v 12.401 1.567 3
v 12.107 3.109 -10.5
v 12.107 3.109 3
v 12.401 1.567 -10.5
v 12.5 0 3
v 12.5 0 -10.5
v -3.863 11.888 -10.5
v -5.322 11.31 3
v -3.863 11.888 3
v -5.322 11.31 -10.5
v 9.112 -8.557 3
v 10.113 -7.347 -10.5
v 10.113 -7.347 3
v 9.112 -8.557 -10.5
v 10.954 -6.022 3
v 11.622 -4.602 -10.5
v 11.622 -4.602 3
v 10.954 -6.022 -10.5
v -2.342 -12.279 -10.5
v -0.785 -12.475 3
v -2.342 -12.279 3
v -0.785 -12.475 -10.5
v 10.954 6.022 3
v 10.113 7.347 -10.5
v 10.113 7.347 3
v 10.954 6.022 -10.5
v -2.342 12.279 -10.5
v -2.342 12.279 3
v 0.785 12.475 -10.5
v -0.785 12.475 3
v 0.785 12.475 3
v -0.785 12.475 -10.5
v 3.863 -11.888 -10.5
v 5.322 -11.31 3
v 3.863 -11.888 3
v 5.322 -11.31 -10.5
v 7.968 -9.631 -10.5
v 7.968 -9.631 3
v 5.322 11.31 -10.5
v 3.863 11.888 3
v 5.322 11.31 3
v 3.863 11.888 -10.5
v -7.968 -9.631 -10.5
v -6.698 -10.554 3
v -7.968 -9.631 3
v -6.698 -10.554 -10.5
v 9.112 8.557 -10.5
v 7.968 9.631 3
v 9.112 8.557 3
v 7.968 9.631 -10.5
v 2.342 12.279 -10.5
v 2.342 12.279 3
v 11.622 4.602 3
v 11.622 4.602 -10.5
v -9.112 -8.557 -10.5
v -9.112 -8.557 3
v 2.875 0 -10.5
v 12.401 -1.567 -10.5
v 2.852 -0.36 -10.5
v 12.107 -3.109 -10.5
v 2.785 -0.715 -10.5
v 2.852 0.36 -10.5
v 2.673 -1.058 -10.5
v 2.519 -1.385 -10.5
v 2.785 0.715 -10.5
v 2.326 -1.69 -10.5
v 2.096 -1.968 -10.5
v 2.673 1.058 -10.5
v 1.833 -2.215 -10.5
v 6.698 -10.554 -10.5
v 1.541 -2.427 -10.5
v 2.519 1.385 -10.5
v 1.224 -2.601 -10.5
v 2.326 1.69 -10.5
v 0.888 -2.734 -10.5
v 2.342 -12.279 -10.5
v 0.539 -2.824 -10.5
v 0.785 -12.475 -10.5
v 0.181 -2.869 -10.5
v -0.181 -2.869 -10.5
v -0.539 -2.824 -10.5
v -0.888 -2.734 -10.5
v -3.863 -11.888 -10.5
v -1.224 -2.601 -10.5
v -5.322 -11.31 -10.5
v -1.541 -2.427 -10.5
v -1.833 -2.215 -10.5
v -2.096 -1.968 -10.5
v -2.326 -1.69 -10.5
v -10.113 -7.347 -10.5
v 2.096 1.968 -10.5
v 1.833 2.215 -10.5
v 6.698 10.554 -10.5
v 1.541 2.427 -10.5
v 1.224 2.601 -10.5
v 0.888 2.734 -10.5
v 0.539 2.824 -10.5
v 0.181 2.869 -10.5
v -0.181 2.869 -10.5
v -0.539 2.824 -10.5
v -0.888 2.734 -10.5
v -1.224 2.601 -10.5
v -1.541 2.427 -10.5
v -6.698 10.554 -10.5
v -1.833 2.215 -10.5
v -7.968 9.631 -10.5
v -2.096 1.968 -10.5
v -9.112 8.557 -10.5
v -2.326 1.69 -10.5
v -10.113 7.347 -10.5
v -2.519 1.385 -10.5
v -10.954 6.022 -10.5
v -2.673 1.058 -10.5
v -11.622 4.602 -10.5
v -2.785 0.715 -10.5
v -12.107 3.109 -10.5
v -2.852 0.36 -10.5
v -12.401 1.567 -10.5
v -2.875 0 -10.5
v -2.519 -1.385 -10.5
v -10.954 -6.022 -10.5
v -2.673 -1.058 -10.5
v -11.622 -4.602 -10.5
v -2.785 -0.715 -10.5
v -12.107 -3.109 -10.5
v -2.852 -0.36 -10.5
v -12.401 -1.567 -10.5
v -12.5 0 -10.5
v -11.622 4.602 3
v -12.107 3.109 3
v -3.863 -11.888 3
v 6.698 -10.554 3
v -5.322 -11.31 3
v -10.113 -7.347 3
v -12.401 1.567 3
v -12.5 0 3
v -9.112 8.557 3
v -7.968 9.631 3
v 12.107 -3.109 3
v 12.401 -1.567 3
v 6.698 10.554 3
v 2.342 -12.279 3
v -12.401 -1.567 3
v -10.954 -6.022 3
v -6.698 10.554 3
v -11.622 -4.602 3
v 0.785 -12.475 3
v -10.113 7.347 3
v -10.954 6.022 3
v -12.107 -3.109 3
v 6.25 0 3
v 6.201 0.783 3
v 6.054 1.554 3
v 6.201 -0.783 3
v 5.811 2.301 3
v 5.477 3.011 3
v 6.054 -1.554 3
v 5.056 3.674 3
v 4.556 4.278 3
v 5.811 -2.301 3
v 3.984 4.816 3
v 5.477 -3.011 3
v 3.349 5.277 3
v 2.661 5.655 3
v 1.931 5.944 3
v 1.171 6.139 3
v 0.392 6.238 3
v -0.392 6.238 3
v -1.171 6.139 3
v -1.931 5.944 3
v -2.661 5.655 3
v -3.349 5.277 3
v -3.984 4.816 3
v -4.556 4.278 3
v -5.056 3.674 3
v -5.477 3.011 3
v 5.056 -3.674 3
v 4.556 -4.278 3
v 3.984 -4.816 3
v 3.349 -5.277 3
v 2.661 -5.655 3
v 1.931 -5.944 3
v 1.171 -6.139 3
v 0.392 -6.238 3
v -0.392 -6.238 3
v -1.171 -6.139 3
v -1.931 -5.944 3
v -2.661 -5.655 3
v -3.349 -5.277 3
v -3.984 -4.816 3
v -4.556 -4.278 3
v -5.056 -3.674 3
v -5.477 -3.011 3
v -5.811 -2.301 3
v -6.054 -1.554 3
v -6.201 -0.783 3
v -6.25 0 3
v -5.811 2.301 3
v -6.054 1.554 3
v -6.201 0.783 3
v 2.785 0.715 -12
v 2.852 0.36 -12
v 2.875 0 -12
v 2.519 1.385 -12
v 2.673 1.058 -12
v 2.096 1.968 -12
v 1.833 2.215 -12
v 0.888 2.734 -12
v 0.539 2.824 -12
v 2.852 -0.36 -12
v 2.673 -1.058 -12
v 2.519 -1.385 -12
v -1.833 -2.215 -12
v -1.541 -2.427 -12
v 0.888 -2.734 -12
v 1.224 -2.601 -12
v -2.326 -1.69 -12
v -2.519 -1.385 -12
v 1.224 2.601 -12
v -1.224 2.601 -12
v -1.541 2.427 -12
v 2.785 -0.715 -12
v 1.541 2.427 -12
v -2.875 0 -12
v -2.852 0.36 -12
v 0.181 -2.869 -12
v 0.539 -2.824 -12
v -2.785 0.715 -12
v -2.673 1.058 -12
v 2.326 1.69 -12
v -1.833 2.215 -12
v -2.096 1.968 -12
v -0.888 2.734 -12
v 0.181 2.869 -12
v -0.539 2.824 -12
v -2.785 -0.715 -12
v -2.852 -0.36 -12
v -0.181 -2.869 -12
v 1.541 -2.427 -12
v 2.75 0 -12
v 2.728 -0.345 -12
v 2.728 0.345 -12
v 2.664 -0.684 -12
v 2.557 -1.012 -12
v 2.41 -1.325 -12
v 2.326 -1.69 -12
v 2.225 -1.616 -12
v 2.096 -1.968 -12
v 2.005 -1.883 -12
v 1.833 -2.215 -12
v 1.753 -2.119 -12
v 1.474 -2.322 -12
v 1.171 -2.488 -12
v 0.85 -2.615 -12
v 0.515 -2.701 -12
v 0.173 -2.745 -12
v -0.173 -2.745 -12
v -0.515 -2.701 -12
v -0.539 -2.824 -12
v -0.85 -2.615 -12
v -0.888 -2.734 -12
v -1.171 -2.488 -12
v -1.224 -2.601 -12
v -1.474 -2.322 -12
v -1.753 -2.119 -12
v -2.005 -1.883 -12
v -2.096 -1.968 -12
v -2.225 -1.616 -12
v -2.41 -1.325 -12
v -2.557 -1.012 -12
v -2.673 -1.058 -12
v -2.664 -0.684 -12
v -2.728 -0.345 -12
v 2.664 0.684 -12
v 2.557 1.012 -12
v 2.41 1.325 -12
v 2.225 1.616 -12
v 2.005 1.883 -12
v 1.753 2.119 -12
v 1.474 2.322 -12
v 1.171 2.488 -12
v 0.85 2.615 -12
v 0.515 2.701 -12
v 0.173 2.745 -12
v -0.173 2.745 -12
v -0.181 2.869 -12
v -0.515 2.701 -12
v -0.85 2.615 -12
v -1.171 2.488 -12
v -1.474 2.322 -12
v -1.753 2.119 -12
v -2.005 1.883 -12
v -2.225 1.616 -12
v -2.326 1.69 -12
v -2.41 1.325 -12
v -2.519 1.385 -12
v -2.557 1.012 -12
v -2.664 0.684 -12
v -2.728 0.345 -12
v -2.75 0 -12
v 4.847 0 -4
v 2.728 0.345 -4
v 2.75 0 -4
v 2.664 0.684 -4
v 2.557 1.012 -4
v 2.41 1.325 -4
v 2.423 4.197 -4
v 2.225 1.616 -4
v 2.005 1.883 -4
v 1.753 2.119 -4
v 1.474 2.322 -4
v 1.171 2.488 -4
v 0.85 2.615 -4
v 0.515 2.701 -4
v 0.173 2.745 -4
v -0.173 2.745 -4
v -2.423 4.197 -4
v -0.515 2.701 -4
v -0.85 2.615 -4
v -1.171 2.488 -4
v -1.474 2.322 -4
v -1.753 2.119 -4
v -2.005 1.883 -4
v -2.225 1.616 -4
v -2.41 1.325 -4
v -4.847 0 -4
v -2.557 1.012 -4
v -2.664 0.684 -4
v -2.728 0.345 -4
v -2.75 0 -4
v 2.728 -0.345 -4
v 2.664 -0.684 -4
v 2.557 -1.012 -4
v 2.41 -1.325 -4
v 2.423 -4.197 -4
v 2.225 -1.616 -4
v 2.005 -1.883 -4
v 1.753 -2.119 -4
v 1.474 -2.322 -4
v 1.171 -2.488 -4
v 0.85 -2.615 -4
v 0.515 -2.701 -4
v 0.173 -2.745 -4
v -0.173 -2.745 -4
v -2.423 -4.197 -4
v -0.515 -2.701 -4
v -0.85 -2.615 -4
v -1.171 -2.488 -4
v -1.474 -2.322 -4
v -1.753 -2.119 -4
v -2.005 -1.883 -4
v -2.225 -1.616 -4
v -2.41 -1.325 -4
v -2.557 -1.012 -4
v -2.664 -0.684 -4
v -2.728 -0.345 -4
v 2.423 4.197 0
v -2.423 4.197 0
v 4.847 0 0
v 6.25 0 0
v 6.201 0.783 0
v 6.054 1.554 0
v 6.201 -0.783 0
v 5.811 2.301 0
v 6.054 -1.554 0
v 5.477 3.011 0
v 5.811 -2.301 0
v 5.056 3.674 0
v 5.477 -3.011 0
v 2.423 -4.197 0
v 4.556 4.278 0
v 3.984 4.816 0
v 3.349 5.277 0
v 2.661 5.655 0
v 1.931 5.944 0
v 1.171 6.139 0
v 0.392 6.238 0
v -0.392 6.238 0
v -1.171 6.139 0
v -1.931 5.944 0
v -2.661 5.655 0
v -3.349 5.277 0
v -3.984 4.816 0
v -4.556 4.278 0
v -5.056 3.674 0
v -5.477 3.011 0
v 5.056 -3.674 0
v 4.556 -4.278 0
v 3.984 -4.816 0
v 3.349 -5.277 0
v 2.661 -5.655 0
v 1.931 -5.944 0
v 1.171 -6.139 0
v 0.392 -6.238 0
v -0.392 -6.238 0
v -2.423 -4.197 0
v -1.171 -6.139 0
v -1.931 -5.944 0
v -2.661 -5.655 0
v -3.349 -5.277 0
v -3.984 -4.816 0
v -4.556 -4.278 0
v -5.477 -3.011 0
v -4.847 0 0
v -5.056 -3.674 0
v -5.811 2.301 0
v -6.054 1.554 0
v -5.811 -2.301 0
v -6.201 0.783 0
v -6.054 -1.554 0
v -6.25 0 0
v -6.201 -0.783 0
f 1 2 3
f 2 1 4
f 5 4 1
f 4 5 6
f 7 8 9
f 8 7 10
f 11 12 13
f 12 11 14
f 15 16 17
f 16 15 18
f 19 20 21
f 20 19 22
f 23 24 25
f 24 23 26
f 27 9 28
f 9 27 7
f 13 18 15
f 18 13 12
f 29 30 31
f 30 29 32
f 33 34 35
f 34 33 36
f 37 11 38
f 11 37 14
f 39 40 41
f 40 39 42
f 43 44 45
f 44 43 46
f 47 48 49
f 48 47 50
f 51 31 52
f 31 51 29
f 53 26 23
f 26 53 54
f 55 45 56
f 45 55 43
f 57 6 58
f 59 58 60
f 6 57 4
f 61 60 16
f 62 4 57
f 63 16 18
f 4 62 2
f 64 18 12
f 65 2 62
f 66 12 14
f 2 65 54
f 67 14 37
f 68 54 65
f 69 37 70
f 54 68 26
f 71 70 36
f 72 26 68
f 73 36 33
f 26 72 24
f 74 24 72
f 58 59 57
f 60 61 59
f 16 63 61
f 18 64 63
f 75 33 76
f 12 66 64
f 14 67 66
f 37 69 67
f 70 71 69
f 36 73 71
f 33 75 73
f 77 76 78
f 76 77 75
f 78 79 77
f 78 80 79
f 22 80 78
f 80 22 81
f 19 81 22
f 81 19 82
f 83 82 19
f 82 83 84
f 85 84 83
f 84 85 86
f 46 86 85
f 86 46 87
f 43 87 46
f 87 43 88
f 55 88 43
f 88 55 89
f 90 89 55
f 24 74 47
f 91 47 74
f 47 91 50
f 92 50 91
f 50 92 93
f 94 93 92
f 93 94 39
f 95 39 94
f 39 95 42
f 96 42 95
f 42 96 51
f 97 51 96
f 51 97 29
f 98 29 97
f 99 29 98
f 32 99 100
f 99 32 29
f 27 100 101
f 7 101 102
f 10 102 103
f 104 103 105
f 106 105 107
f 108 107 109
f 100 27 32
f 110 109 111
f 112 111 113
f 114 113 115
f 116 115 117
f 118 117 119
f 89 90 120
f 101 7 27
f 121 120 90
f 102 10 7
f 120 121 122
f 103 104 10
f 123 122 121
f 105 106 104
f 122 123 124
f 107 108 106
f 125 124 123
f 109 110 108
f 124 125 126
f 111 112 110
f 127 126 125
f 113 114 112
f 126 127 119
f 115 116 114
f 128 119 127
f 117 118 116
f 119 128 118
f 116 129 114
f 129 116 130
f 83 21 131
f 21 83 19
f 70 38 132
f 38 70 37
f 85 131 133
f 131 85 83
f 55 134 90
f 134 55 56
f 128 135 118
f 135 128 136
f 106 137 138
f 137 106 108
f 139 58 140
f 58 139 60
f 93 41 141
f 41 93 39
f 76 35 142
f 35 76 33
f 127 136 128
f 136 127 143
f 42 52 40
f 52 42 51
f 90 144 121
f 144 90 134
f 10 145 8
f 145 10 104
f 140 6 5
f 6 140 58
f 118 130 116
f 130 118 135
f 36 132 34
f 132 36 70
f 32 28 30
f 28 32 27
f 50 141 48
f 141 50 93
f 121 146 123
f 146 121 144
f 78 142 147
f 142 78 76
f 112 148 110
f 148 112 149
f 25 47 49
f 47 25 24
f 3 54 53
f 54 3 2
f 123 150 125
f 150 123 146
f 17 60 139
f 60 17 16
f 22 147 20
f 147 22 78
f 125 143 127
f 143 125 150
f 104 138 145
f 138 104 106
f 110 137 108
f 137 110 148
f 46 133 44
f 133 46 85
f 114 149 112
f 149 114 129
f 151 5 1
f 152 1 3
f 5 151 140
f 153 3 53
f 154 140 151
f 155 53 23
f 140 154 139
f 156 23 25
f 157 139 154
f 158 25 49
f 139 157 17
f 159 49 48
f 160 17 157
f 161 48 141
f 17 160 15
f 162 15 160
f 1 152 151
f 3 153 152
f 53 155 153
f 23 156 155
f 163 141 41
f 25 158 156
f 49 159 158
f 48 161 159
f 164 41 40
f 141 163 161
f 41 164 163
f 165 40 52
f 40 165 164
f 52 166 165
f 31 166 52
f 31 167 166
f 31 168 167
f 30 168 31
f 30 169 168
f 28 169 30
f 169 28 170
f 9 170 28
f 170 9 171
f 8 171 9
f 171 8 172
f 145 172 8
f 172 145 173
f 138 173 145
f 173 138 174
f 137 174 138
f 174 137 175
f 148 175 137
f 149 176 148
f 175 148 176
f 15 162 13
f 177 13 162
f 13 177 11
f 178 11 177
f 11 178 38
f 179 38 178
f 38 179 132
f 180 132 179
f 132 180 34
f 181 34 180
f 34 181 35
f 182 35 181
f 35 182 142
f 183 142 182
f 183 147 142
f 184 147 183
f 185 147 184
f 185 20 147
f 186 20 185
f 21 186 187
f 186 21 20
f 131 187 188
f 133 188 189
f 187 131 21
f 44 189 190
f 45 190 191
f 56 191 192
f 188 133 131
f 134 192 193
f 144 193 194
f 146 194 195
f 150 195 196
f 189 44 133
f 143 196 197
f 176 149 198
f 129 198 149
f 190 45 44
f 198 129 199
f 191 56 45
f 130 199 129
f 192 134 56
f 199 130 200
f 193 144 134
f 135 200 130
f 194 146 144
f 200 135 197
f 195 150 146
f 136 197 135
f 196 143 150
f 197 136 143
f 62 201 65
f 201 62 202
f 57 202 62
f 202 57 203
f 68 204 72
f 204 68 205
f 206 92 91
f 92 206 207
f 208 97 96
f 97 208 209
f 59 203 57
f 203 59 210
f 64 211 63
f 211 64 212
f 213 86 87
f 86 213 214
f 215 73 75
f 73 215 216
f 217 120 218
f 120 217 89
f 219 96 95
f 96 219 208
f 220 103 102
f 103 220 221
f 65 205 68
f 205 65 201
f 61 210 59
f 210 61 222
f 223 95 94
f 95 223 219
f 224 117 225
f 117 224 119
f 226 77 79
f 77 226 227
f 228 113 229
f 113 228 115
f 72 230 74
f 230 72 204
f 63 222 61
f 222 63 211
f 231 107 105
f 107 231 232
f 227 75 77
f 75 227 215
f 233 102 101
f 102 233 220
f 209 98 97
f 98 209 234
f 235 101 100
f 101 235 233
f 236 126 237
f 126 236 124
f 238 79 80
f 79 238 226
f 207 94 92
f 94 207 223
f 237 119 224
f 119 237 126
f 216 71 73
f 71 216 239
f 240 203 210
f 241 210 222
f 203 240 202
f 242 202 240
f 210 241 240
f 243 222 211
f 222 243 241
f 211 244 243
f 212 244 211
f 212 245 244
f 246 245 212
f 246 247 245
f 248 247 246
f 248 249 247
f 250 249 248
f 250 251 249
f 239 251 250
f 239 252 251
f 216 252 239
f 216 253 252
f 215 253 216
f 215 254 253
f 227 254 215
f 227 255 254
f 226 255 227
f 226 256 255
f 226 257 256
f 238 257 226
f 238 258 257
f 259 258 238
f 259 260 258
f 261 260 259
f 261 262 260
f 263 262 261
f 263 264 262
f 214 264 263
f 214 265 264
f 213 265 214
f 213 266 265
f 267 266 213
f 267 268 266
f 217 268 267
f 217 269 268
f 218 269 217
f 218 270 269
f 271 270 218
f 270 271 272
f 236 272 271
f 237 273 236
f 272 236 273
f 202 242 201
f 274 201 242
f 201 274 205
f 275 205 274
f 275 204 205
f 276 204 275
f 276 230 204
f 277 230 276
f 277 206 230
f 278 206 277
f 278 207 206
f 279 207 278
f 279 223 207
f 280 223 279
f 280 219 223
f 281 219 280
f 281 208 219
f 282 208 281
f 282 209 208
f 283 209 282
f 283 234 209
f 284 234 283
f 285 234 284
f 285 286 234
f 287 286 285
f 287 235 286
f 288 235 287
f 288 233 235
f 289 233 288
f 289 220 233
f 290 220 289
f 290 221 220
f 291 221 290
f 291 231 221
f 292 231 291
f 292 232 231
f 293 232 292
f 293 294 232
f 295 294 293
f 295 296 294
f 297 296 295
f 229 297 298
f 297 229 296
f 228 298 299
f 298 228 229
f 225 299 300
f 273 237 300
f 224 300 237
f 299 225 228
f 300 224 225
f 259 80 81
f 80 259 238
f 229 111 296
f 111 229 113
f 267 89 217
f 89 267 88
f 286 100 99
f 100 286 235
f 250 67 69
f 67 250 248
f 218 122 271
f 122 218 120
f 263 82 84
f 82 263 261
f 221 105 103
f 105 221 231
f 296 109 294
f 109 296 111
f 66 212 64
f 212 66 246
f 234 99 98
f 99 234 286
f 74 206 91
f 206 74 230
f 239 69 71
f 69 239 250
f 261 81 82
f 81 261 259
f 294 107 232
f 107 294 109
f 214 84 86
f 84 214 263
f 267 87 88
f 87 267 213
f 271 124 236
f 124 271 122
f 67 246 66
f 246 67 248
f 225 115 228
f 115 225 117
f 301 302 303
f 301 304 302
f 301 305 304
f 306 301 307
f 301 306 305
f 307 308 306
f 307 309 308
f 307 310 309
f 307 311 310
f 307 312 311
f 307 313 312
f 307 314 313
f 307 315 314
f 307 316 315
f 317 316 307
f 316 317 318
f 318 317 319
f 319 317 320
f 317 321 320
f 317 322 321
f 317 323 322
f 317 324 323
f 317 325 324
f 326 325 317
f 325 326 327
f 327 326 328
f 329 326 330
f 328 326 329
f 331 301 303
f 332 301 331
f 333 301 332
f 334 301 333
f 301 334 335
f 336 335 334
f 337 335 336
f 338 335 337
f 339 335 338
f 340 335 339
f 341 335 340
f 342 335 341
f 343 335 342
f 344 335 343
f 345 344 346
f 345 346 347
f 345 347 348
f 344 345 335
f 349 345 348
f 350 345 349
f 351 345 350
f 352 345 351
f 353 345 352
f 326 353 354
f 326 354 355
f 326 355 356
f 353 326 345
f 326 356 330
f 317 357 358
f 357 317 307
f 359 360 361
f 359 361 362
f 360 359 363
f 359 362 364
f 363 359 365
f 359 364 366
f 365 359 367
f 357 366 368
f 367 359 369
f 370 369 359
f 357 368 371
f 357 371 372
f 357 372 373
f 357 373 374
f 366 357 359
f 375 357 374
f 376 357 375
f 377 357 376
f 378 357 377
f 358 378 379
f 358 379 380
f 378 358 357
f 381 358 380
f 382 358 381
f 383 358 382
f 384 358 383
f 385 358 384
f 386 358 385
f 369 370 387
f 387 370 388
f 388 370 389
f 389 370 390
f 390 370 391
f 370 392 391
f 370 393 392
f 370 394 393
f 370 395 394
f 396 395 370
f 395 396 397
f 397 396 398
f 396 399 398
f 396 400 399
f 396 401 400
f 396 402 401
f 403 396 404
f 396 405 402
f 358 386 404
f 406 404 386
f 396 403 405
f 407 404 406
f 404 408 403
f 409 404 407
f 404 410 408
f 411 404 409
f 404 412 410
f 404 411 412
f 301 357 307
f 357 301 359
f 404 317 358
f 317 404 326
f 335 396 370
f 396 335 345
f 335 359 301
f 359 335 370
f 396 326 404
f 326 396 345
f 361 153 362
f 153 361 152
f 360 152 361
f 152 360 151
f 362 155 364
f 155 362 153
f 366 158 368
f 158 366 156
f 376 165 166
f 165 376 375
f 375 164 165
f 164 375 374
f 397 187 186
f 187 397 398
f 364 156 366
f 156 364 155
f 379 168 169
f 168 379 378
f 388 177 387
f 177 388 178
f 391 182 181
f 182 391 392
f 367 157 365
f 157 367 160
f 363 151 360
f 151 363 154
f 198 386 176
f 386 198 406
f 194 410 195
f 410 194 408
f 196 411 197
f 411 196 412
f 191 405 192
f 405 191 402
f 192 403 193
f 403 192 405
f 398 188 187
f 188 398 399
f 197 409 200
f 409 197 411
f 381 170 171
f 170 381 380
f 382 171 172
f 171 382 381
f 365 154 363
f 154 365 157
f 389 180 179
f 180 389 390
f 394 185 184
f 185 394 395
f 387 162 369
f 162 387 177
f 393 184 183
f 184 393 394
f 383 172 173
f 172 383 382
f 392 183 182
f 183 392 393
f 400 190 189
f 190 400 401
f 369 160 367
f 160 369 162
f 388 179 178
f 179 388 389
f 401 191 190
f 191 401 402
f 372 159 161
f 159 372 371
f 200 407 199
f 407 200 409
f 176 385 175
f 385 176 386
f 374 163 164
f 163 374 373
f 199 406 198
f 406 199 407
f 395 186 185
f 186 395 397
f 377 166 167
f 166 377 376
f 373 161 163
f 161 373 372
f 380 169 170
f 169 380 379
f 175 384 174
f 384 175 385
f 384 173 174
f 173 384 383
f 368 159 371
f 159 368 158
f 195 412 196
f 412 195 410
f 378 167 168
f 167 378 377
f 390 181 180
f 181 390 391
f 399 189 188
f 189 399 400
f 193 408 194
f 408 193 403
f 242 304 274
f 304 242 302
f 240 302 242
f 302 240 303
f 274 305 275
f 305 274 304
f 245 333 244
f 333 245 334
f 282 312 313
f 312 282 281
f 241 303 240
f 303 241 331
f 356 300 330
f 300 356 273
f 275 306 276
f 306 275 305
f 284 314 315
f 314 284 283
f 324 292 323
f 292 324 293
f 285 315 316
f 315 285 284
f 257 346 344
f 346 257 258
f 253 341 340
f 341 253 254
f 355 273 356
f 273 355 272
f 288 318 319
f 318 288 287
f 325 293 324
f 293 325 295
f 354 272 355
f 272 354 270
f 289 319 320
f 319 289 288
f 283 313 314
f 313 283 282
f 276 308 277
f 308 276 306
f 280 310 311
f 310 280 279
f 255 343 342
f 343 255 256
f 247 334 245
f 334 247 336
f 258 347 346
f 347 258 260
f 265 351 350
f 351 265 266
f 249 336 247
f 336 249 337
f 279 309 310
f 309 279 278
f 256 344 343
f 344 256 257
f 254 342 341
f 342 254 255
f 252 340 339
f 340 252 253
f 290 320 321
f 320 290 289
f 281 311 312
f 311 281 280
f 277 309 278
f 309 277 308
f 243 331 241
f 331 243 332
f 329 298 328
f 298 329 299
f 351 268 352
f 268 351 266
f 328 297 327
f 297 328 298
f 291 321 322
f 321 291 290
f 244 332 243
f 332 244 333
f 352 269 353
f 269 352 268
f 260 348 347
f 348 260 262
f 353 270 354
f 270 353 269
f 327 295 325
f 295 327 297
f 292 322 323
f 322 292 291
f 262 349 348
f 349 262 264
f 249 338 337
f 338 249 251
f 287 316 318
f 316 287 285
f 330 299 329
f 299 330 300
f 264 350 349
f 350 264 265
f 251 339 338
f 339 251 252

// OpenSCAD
$fn = 50;


difference() {
	union() {
		translate(v = [0, 0, -10.5000000000]) {
			cylinder(h = 13.5000000000, r = 12.5000000000);
		}
		#translate(v = [0, 0, -12.0000000000]) {
			cylinder(h = 12, r = 2.8750000000);
		}
	}
	union() {
		translate(v = [0, 0, 0]) {
			rotate(a = [0, 0, 0]) {
				difference() {
					union() {
						translate(v = [0, 0, -4]) {
							linear_extrude(height = 4) {
								polygon(points = [[4.8468000000, 0.0000000000], [2.4234000000, 4.1974519271], [-2.4234000000, 4.1974519271], [-4.8468000000, 0.0000000000], [-2.4234000000, -4.1974519271], [2.4234000000, -4.1974519271]]);
							}
						}
					}
					union();
				}
			}
		}
		#cylinder(h = 3, r = 6.2500000000);
		#translate(v = [0, 0, -100.0000000000]) {
			cylinder(h = 200, r = 2.7500000000);
		}
	}
}
